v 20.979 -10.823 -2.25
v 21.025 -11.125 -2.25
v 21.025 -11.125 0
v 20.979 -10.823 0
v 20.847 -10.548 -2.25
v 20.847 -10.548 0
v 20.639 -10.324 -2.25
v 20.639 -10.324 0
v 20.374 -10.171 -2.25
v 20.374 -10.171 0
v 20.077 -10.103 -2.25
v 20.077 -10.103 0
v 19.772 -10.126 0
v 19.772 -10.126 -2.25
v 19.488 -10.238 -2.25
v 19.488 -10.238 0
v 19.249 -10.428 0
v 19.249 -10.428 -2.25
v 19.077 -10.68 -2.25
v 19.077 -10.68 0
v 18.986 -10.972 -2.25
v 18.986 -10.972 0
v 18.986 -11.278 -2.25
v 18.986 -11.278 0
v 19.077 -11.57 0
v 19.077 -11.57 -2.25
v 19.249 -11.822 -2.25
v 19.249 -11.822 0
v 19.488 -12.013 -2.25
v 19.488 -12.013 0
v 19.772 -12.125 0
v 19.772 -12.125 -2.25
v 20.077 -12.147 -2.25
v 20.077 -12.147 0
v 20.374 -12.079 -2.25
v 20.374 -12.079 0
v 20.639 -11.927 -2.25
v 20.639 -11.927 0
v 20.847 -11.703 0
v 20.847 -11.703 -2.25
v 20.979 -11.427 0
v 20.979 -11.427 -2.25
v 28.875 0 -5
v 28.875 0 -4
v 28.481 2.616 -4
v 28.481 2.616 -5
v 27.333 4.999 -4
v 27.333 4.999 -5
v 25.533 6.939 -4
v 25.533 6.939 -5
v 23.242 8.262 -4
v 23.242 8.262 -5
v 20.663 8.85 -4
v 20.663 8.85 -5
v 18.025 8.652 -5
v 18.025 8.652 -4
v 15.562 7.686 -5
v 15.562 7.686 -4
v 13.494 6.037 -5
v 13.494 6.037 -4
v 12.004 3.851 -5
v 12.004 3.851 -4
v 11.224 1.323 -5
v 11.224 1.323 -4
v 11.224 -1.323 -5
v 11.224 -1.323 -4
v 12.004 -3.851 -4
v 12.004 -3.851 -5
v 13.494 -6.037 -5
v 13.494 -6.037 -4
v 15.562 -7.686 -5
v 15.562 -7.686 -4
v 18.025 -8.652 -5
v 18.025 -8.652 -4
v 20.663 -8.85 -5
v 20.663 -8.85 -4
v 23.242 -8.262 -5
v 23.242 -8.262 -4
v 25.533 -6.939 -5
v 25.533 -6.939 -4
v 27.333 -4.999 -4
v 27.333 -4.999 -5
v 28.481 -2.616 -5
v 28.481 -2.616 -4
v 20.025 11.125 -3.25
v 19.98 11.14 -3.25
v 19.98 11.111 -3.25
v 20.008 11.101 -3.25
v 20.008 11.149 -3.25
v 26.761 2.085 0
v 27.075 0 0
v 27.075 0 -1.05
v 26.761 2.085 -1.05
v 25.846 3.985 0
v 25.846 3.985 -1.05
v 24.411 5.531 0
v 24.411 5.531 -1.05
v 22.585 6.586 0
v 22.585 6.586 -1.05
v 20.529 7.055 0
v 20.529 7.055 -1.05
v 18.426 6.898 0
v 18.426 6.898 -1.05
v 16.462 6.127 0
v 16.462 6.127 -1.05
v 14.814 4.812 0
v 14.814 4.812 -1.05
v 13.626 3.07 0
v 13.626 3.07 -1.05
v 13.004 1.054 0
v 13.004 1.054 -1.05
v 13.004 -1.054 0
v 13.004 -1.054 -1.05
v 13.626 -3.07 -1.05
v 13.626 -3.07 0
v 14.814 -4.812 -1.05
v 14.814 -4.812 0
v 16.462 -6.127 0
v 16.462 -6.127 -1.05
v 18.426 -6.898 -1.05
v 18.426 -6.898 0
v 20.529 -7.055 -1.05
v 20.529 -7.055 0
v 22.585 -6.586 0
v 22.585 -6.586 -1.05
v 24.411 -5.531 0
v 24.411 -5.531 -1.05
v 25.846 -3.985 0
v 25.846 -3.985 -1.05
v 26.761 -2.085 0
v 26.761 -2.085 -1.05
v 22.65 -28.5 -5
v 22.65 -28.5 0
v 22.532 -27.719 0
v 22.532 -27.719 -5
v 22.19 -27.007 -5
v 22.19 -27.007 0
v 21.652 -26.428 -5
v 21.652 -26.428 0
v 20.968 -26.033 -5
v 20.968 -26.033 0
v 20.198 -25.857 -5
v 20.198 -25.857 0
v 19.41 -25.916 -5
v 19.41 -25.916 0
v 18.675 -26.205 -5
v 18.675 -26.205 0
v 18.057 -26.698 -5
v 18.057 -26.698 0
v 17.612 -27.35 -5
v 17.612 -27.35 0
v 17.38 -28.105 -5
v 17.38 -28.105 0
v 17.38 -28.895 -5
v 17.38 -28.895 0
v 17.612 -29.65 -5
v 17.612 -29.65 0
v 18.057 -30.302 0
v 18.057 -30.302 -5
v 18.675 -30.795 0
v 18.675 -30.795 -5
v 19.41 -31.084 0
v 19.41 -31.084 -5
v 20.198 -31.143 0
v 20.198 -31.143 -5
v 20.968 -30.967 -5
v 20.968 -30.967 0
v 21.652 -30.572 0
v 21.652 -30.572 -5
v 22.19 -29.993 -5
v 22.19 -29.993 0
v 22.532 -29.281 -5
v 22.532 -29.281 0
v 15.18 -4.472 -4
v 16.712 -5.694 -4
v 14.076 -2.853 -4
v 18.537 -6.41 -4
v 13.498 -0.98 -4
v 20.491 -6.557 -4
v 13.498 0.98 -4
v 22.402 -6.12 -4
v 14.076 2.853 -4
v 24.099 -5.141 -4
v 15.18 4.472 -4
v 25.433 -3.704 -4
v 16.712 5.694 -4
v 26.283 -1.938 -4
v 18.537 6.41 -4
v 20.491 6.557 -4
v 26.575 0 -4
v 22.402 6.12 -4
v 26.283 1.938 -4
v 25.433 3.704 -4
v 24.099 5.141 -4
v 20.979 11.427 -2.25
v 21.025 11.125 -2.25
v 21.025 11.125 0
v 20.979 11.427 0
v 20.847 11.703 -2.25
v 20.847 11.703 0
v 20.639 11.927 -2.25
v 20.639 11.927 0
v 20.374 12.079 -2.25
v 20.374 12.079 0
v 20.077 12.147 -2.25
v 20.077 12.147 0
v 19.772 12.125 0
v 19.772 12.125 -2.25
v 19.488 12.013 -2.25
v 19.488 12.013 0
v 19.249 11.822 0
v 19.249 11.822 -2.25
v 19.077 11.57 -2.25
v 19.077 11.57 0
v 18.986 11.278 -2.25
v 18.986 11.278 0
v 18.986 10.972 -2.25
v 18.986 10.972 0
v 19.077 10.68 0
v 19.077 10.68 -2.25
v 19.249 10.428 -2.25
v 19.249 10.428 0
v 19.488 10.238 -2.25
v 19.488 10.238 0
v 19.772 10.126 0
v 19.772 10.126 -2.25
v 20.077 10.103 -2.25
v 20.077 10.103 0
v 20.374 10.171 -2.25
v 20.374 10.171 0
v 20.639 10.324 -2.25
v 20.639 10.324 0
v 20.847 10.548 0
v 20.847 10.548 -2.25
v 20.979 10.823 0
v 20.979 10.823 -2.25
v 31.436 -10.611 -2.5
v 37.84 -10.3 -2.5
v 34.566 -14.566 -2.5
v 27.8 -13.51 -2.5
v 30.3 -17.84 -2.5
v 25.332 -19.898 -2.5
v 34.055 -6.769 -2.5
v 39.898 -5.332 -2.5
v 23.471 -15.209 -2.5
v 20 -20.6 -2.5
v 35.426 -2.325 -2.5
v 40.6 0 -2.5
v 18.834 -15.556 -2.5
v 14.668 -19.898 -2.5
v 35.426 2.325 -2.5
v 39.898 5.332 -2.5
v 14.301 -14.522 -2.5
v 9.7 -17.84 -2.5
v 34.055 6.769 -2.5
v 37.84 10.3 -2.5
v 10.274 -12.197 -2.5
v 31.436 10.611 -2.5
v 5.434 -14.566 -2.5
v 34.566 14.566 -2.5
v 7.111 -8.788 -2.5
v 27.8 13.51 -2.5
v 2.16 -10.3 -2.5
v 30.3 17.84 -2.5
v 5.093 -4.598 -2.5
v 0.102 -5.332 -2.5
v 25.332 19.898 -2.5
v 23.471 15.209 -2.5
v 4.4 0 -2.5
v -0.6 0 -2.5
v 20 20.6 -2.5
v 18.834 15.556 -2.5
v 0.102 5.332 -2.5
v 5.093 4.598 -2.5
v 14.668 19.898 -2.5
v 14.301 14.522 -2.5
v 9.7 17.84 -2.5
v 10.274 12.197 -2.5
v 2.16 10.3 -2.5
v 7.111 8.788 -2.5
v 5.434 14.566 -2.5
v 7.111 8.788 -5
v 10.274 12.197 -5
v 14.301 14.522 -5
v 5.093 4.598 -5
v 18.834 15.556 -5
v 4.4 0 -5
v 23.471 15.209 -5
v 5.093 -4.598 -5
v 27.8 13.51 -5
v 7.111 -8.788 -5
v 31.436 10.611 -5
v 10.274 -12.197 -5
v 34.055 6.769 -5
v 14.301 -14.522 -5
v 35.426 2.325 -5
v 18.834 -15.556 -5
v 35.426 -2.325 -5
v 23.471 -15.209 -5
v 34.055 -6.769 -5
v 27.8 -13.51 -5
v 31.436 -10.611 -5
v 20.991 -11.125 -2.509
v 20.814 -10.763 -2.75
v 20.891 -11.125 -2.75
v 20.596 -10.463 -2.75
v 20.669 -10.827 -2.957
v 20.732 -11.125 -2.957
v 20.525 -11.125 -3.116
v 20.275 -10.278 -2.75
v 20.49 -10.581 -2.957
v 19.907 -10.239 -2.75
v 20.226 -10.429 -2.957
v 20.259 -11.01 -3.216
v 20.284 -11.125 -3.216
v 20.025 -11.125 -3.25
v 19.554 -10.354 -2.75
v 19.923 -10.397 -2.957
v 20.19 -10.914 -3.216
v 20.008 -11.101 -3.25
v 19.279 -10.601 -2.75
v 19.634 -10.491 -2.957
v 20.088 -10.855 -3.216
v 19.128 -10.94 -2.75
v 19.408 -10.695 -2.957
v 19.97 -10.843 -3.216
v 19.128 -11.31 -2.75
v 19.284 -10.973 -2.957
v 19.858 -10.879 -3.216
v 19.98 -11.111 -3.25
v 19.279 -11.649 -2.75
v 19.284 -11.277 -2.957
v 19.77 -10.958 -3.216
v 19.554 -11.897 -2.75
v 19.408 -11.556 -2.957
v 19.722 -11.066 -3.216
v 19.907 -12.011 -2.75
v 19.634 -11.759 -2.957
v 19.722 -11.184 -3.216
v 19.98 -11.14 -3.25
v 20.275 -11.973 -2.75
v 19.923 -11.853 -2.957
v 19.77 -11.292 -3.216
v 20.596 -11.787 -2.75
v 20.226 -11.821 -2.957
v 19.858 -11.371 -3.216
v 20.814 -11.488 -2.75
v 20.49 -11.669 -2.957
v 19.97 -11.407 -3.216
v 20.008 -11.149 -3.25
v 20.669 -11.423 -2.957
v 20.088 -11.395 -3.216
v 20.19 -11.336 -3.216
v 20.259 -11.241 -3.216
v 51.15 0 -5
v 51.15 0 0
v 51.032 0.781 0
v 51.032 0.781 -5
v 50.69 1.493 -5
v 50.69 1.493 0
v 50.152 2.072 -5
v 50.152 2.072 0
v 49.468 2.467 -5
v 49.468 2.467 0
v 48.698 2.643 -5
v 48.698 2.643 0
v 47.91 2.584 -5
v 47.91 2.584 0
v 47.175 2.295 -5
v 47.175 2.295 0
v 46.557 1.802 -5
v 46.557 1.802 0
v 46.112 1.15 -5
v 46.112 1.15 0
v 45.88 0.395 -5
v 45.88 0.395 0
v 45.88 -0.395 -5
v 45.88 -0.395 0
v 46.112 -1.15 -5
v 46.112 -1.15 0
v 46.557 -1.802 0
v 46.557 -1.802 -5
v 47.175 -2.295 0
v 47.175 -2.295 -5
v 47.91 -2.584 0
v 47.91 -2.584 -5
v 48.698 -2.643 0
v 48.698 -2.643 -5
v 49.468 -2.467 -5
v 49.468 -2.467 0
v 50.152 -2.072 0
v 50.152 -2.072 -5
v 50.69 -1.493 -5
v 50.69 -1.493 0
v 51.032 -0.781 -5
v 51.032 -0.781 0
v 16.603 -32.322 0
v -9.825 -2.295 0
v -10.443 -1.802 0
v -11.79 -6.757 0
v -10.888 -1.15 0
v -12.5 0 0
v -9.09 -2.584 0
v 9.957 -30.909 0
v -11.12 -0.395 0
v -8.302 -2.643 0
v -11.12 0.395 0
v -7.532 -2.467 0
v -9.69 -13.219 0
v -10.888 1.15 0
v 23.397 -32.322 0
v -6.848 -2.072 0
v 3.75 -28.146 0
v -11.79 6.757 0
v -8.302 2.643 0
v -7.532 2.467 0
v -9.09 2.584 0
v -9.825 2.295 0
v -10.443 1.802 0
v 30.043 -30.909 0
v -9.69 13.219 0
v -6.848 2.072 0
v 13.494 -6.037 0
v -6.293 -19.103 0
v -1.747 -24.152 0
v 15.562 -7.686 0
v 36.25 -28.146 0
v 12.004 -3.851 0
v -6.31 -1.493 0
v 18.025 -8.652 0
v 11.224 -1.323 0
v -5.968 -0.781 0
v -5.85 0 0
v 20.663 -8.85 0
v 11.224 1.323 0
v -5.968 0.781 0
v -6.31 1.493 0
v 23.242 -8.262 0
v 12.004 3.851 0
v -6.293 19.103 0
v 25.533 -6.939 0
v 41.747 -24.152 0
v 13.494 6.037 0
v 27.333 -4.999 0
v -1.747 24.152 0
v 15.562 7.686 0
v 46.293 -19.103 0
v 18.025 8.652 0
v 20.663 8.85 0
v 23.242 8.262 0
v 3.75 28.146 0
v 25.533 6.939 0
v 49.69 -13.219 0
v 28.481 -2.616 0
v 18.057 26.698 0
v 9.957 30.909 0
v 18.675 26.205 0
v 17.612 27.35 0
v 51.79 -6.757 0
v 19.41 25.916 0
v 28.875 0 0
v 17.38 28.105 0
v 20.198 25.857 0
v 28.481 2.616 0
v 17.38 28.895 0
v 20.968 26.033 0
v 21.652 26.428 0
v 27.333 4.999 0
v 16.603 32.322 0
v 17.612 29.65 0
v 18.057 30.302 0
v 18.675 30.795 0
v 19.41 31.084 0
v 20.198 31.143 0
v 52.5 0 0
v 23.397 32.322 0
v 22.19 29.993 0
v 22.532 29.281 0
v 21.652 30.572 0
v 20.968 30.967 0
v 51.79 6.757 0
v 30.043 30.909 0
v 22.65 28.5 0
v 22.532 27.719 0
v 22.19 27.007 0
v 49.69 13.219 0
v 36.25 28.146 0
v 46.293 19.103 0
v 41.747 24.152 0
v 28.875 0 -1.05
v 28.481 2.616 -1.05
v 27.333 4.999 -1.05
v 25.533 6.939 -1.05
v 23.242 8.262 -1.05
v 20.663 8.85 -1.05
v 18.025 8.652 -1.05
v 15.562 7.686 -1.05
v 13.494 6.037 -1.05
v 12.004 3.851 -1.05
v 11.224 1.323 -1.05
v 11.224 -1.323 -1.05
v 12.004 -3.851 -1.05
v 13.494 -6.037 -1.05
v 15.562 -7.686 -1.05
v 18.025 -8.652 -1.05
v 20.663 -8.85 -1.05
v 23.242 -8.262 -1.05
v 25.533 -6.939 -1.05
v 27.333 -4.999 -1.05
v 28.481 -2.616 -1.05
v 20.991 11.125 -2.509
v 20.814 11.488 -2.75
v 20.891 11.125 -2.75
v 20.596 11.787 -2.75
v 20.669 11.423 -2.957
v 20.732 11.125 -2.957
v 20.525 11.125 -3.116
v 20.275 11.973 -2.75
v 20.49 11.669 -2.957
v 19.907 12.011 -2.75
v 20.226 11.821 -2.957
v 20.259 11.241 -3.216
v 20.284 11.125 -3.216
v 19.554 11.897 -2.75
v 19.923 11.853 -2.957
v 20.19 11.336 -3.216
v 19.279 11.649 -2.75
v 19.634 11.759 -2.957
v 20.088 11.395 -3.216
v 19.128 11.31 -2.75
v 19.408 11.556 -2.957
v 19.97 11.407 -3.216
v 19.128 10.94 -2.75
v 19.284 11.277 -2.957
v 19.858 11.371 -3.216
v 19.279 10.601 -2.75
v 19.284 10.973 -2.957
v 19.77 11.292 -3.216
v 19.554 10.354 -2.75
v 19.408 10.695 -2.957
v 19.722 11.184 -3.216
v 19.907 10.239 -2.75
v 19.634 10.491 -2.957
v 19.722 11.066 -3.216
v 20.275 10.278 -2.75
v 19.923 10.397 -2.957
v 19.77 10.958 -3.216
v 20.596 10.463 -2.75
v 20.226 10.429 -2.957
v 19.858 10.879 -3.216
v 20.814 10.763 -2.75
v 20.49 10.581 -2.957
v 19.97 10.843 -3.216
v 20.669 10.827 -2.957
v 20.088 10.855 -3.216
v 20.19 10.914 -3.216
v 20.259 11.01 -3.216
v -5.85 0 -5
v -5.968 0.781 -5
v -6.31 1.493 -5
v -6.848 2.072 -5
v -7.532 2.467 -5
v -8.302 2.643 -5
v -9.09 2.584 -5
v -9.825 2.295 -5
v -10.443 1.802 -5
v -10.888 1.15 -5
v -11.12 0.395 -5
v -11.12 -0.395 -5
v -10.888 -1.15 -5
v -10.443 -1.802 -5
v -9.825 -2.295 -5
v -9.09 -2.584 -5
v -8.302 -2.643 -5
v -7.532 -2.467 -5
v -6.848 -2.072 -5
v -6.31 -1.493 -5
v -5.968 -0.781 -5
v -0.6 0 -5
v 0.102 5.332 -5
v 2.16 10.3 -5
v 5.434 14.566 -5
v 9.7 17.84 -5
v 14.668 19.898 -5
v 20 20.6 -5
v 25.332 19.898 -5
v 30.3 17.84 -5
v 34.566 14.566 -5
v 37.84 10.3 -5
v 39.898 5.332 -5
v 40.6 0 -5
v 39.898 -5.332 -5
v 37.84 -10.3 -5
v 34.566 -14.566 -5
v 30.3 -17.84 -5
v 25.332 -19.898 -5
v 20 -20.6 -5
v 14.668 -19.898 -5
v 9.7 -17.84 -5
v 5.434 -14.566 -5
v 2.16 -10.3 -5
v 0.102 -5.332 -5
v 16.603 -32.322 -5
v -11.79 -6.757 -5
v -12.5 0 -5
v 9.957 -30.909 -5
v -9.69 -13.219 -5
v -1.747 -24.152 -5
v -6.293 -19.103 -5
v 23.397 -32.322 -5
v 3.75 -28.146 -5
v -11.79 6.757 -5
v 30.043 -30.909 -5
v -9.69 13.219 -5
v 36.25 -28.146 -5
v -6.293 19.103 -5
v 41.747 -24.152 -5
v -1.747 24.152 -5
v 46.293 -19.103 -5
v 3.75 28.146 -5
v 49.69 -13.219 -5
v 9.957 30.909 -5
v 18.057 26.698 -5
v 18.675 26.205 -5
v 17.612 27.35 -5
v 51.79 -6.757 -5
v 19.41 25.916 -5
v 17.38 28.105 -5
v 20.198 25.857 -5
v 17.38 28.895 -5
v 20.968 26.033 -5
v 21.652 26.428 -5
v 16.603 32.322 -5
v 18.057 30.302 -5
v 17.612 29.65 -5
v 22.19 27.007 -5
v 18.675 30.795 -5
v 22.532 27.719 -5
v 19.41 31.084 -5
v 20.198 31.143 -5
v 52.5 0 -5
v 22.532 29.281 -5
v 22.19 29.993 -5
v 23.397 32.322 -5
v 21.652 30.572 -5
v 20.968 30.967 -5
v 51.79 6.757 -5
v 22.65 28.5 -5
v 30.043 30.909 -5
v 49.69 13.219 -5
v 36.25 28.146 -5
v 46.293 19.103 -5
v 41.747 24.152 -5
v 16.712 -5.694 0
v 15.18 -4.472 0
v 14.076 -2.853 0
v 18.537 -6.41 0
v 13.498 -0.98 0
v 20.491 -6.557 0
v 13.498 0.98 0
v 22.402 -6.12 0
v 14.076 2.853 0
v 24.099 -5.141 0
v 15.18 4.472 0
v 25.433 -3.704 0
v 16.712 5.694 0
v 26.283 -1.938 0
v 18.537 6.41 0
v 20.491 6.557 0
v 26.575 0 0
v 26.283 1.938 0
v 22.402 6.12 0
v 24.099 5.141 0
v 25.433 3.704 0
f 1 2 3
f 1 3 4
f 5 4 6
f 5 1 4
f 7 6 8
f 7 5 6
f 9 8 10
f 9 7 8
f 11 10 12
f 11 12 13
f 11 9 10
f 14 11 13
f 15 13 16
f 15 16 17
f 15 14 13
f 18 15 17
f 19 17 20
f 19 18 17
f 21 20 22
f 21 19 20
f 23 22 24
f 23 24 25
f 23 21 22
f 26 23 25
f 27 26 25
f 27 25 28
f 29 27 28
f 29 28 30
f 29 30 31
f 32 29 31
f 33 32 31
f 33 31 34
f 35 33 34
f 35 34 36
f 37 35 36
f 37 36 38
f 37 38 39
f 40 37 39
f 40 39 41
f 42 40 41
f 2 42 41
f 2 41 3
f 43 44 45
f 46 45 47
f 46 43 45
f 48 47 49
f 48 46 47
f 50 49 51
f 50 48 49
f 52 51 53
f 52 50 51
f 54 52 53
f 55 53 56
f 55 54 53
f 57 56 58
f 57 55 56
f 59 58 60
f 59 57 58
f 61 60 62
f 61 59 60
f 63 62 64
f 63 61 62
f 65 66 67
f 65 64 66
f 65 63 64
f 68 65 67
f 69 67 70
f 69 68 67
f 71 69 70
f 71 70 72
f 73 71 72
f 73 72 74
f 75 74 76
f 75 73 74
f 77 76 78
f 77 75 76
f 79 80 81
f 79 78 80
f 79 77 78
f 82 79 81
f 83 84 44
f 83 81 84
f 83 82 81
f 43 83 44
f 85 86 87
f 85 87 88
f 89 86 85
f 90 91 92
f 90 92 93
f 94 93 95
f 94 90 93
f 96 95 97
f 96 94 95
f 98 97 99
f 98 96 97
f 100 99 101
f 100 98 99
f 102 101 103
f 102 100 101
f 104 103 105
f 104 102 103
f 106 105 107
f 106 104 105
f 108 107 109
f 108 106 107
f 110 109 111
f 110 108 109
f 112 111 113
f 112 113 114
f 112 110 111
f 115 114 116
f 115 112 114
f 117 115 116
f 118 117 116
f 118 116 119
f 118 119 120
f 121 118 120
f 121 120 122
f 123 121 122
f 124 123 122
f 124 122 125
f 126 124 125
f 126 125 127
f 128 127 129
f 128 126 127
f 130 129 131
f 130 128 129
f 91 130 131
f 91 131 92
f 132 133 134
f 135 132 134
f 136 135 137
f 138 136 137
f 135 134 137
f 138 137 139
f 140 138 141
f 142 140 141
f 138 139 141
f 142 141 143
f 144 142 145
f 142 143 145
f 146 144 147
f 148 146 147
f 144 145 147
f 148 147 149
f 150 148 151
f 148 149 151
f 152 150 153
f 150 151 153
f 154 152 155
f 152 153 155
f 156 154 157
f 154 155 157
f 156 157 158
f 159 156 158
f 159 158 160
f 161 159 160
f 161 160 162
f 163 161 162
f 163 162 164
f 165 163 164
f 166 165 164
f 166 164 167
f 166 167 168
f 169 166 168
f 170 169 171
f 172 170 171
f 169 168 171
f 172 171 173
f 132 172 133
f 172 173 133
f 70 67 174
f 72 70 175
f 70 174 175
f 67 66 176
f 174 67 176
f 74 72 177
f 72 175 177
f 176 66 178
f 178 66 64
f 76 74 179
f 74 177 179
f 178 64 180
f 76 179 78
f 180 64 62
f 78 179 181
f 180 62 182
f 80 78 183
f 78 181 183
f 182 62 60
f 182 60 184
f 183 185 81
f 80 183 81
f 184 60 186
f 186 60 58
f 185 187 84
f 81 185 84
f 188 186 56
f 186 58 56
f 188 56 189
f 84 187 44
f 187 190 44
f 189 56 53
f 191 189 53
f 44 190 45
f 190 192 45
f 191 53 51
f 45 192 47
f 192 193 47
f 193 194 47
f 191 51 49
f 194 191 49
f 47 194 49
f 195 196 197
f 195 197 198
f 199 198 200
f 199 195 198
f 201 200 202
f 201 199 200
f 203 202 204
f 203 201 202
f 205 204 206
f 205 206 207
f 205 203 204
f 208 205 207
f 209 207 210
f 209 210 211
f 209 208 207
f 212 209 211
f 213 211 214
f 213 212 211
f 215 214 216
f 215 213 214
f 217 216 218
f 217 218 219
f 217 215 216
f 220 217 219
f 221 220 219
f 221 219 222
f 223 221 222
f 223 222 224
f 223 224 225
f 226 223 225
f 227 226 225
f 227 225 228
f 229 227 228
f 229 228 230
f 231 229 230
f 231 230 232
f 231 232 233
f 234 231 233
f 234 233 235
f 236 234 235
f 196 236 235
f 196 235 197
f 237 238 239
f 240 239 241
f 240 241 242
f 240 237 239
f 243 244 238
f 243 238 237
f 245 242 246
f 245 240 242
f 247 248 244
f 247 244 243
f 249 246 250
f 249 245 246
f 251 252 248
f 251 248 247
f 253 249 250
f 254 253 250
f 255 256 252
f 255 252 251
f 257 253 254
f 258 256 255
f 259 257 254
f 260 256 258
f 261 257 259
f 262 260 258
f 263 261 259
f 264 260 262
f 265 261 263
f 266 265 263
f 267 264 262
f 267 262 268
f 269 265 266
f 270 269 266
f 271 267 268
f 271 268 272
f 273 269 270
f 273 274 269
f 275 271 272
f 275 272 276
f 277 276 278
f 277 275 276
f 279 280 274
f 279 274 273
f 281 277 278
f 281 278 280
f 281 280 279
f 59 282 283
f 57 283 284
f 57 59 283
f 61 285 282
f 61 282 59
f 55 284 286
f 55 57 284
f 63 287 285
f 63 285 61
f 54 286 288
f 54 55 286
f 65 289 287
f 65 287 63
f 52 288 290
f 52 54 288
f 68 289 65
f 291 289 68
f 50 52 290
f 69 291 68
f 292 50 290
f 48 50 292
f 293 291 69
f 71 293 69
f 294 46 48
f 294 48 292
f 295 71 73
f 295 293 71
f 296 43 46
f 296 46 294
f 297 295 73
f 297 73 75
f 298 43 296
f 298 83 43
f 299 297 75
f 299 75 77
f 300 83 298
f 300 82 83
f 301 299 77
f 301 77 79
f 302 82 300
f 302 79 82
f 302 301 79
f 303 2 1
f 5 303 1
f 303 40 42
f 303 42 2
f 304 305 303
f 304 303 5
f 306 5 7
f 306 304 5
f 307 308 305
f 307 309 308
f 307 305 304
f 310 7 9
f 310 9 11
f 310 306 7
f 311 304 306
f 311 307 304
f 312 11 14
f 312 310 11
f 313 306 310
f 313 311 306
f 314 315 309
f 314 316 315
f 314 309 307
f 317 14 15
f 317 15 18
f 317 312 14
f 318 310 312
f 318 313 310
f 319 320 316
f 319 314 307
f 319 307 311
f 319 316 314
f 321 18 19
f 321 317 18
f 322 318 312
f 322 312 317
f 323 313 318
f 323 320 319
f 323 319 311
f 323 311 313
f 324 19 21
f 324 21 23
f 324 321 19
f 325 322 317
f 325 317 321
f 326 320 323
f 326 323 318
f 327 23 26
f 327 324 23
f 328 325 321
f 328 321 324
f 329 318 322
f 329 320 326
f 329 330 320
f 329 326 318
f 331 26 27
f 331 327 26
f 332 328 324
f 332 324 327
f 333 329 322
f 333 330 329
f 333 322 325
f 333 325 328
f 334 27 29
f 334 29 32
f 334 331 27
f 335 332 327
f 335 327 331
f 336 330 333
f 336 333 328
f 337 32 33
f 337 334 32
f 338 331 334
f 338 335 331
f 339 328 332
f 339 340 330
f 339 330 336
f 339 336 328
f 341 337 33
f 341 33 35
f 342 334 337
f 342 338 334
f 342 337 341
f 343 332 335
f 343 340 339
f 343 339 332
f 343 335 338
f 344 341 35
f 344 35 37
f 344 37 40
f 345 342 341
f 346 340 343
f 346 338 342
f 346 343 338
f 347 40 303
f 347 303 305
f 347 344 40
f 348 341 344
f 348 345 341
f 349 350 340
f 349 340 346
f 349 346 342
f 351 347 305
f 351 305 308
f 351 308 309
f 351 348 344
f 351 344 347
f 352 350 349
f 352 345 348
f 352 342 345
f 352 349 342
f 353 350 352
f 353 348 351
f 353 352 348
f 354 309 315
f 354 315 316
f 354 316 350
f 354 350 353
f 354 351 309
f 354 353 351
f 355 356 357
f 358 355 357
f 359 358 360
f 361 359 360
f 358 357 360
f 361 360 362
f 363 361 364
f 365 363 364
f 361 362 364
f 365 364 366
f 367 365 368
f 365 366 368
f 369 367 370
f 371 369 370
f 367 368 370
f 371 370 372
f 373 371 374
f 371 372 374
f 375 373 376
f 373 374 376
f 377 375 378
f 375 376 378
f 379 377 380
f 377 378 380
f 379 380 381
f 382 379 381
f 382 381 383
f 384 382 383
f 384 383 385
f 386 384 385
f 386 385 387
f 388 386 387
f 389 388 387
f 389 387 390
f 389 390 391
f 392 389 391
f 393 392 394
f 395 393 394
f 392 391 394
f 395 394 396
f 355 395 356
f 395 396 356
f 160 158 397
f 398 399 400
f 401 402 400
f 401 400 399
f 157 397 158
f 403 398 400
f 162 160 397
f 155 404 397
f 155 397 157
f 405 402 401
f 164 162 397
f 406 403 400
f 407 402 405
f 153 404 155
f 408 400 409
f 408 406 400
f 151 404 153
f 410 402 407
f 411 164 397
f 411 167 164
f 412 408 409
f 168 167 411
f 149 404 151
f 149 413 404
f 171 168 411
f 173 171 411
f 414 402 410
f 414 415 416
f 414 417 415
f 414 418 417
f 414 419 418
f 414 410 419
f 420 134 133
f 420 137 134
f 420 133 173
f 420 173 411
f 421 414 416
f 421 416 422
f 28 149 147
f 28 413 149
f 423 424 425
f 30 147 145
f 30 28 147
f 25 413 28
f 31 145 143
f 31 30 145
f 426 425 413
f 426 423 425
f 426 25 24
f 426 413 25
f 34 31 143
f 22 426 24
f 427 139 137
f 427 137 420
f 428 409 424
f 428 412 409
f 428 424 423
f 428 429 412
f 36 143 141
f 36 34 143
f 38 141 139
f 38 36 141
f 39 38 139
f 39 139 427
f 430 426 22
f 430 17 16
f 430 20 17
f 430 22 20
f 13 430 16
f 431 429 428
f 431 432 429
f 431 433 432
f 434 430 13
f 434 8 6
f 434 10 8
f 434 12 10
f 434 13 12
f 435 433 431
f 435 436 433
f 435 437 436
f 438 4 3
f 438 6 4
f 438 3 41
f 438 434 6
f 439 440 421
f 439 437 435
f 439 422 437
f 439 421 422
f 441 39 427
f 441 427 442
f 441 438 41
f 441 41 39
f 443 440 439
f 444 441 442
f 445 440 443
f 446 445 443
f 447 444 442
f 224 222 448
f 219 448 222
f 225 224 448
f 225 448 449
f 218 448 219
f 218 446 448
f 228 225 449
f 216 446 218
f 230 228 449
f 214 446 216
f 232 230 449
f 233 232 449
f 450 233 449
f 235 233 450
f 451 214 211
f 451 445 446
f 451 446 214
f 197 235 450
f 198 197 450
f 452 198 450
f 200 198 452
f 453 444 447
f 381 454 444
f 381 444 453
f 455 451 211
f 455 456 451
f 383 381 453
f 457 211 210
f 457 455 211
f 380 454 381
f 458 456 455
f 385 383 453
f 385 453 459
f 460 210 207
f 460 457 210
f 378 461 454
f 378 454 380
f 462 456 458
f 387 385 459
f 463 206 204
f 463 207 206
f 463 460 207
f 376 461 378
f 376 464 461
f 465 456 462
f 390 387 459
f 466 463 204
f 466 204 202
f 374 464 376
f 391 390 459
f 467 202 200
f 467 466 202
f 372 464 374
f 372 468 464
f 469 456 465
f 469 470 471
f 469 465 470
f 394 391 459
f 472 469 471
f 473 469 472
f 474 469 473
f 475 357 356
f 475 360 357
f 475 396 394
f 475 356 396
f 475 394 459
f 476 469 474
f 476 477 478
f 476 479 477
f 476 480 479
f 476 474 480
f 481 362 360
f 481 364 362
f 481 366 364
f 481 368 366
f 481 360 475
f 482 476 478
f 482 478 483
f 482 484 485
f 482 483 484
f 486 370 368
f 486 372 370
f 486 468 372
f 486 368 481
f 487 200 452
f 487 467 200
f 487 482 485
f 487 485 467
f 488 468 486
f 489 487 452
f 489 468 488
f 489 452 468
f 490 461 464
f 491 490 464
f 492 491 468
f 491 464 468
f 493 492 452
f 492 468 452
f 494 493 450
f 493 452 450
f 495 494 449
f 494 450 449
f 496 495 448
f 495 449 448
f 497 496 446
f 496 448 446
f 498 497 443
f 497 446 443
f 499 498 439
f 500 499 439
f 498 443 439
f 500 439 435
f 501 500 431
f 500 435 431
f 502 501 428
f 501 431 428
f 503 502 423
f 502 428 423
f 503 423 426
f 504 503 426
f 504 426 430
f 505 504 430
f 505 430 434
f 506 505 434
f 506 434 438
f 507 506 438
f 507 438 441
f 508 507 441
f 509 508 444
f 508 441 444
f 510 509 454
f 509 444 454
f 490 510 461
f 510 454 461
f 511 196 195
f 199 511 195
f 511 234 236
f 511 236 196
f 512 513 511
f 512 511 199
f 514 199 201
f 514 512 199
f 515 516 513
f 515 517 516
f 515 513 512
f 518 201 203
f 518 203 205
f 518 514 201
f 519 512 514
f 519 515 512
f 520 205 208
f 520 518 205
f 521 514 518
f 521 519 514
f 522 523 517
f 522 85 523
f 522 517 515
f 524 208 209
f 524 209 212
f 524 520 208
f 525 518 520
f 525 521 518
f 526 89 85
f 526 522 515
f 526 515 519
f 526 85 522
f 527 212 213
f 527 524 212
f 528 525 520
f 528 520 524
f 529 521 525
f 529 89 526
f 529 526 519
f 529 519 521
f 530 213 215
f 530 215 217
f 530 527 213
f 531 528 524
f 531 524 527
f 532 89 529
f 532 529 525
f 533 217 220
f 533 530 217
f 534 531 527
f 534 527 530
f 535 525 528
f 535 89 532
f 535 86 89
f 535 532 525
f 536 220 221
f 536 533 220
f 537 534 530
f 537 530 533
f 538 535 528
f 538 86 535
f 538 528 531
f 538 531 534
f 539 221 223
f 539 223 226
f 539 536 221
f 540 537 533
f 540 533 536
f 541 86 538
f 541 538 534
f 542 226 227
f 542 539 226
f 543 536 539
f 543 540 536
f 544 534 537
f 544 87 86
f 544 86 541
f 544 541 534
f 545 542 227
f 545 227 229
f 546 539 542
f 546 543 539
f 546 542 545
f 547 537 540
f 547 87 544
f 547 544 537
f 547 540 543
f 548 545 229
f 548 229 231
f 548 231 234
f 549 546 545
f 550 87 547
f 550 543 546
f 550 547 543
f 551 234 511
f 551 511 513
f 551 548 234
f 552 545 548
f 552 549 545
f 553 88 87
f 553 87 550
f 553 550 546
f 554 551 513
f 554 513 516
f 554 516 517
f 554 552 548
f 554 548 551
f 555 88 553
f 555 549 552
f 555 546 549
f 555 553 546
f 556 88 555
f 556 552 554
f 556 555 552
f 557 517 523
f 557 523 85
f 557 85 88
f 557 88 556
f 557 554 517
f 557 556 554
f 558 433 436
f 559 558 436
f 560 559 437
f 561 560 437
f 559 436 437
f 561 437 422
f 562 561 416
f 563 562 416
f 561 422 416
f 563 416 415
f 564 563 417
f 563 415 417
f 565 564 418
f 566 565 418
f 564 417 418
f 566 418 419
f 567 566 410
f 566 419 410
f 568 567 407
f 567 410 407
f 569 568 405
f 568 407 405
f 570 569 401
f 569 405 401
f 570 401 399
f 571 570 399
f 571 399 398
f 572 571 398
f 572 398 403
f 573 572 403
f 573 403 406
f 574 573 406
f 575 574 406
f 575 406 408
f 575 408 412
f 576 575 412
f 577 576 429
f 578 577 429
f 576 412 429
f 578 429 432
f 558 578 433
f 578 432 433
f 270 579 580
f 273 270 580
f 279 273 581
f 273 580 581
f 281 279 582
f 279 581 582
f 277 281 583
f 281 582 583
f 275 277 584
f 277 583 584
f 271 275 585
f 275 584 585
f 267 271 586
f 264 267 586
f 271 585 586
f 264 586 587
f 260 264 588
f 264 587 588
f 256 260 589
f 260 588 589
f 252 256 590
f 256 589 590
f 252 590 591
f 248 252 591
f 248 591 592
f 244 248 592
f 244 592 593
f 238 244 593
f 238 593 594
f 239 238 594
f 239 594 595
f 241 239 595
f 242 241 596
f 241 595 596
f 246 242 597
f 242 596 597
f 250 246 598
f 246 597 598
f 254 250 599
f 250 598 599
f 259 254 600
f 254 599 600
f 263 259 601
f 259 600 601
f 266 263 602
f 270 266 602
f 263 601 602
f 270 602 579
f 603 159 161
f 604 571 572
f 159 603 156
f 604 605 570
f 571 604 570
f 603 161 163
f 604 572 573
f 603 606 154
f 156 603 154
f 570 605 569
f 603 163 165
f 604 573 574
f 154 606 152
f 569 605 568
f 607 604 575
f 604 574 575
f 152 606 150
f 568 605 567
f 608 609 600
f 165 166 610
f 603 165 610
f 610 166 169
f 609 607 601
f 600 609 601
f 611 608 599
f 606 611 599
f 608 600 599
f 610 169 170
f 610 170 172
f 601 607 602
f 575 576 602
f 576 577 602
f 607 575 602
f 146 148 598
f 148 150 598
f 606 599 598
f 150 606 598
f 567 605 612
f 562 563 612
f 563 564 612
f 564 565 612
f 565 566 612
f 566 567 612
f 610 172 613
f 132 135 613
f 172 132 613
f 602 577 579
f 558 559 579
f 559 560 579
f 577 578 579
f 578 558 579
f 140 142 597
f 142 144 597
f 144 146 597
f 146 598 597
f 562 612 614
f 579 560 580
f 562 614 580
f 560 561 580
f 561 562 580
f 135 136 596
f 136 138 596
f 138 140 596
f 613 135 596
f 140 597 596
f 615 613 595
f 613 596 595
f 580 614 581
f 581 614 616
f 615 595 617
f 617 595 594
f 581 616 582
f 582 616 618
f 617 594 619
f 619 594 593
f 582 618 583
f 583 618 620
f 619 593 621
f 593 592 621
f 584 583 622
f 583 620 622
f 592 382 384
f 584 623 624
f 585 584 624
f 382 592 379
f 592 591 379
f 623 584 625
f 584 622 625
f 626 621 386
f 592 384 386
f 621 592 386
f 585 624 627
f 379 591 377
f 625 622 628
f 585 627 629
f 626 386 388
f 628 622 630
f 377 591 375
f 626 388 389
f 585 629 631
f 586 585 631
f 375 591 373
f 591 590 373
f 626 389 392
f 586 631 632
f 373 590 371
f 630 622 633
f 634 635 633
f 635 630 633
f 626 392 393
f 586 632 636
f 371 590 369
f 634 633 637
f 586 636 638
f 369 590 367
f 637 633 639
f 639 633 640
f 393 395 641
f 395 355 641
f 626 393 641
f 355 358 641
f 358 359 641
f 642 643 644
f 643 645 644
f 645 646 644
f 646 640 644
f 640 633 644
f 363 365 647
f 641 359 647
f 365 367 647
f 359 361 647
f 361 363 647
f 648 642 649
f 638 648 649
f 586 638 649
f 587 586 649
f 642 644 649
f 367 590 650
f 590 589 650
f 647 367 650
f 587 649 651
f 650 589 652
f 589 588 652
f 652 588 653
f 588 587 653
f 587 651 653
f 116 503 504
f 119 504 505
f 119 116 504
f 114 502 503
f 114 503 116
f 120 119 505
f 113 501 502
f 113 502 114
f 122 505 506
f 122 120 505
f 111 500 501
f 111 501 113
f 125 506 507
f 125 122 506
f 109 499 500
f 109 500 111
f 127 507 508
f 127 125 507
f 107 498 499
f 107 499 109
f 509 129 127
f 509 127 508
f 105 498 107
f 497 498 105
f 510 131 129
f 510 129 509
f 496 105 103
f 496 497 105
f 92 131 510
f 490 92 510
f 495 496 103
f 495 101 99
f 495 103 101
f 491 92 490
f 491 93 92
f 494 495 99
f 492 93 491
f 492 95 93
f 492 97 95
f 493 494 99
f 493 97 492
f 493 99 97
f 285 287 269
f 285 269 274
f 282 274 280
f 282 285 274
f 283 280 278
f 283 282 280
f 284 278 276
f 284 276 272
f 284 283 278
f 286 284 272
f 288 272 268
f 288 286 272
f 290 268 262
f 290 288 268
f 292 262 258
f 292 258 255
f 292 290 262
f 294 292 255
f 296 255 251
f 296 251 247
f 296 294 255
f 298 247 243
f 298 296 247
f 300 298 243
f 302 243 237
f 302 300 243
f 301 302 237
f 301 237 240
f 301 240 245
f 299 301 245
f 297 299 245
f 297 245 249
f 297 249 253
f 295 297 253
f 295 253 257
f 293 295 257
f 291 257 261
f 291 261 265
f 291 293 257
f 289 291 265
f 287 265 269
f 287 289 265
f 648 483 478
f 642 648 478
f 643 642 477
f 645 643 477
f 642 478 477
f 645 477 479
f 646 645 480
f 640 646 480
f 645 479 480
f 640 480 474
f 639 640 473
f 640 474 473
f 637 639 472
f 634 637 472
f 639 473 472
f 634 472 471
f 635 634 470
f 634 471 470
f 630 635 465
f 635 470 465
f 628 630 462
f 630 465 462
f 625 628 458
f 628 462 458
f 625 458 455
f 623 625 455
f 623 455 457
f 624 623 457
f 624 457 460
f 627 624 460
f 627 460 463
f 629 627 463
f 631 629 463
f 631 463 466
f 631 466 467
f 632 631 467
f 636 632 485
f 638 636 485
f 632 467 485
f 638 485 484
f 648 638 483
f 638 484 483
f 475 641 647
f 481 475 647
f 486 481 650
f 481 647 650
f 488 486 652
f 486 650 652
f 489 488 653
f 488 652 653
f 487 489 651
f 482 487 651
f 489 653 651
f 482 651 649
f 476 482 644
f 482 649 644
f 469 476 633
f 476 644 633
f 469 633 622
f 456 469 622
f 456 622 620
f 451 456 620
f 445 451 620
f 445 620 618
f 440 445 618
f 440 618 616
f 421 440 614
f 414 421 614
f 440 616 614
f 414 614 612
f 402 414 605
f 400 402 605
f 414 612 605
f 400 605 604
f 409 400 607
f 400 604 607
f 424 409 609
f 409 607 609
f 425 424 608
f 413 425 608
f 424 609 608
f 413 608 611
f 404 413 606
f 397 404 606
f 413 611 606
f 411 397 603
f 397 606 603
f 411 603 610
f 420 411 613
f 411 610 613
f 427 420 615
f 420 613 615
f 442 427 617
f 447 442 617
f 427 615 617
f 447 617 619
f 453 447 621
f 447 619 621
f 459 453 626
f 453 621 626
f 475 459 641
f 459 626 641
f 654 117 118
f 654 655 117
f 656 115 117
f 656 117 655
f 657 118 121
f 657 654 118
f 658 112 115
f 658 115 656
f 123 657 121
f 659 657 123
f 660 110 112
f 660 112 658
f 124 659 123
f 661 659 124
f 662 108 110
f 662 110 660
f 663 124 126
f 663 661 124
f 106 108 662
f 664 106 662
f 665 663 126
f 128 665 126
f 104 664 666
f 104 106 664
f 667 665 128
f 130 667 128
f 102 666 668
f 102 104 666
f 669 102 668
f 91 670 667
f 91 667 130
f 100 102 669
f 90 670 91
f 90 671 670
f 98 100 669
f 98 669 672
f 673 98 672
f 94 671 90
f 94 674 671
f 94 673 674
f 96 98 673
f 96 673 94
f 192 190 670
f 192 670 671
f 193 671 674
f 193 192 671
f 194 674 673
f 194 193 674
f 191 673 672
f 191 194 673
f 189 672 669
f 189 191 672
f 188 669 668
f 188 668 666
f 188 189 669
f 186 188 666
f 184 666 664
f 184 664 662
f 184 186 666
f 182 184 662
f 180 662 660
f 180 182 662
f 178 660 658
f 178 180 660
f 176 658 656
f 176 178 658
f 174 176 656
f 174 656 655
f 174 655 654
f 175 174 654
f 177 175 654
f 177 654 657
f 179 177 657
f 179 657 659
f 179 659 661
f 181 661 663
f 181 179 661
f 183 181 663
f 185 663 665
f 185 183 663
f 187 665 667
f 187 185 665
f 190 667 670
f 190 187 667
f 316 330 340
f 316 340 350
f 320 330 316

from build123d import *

# Parameters (mm, degrees)
BOSS_EXTRUDE1_START       = -4
BOSS_EXTRUDE1_OUTLINE_R   = 2.2
BOSS_EXTRUDE1_OUTLINE_R_2 = 1.025
BOSS_EXTRUDE1_OUTLINE_R_3 = 6.575
BOSS_EXTRUDE1_DEPTH       = 4
SKETCH3_R                 = 8.875
SKETCH3_R_2               = 7.075
CUT_EXTRUDE1_DEPTH        = 1.05
BOSS_EXTRUDE2_START       = -4
SKETCH4_R                 = 1.025
BOSS_EXTRUDE2_DEPTH       = 0.75
FILLET1_R                 = 1
BOSS_EXTRUDE3_START       = -5
SKETCH5_R                 = 32.5
SKETCH5_R_2               = 1.025
SKETCH5_R_3               = 8.875
BOSS_EXTRUDE3_DEPTH       = 5
SKETCH6_R                 = 2.65
CUT_EXTRUDE2_DEPTH        = 5
SKETCH7_R                 = 20.6
SKETCH7_R_2               = 15.6
CUT_EXTRUDE3_DEPTH        = 2.5
BOSS_EXTRUDE4_START       = 1
SKETCH8_R                 = 1.025
BOSS_EXTRUDE4_DEPTH       = 1


# Read off the part's stored shape, not the designer's step: Boss-Extrude1
with BuildPart() as part:
    # Boss-Extrude1 outline → Boss-Extrude1 (new body)
    with BuildSketch(Plane.XY.offset(BOSS_EXTRUDE1_START)):
        with BuildLine():
            Line((-5.8, 12.8), (-5.8, -12.8))
            ThreePointArc((-5.8, -12.8), (-1.992388155, -21.992388155), (7.2, -25.8))
            Line((7.2, -25.8), (32.8, -25.8))
            ThreePointArc((32.8, -25.8), (41.992388155, -21.992388155), (45.8, -12.8))
            Line((45.8, -12.8), (45.8, 12.8))
            ThreePointArc((45.8, 12.8), (41.992388155, 21.992388155), (32.8, 25.8))
            Line((32.8, 25.8), (7.2, 25.8))
            ThreePointArc((7.2, 25.8), (-1.992388155, 21.992388155), (-5.8, 12.8))
        make_face()
        with Locations((25, -22)):
            Circle(BOSS_EXTRUDE1_OUTLINE_R, mode=Mode.SUBTRACT)
        with Locations((20, -11.1252)):
            Circle(BOSS_EXTRUDE1_OUTLINE_R_2, mode=Mode.SUBTRACT)
        with Locations((-2, 0)):
            Circle(BOSS_EXTRUDE1_OUTLINE_R, mode=Mode.SUBTRACT)
        with Locations((20, 0)):
            Circle(BOSS_EXTRUDE1_OUTLINE_R_3, mode=Mode.SUBTRACT)
        with Locations((20, 11.1252)):
            Circle(BOSS_EXTRUDE1_OUTLINE_R_2, mode=Mode.SUBTRACT)
        with Locations((42, 0)):
            Circle(BOSS_EXTRUDE1_OUTLINE_R, mode=Mode.SUBTRACT)
        with Locations((25, 22)):
            Circle(BOSS_EXTRUDE1_OUTLINE_R, mode=Mode.SUBTRACT)
    extrude(amount=BOSS_EXTRUDE1_DEPTH)

    # Sketch3 → Cut-Extrude1 (cut)
    with BuildSketch(Plane.XY):
        with Locations((20, 0)):
            Circle(SKETCH3_R)
        with Locations((20, 0)):
            Circle(SKETCH3_R_2, mode=Mode.SUBTRACT)
    extrude(amount=-CUT_EXTRUDE1_DEPTH, mode=Mode.SUBTRACT)

    # Sketch4 → Boss-Extrude2 (add)
    with BuildSketch(Plane.XY.offset(BOSS_EXTRUDE2_START)):
        with Locations((20, 11.1252)):
            Circle(SKETCH4_R)
        with Locations((20, -11.1252)):
            Circle(SKETCH4_R)
    extrude(amount=BOSS_EXTRUDE2_DEPTH)

    # Fillet1
    fillet1_edges = [part.edges().sort_by_distance(p)[0] for p in [
        (18.975, 11.1252, -3.25),
        (18.975, -11.1252, -3.25),
    ]]
    fillet(fillet1_edges, radius=FILLET1_R)

    # Sketch5 → Boss-Extrude3 (add)
    with BuildSketch(Plane.XY.offset(BOSS_EXTRUDE3_START)):
        with Locations((20, 0)):
            Circle(SKETCH5_R)
        with Locations((20, -11.1252)):
            Circle(SKETCH5_R_2, mode=Mode.SUBTRACT)
        with Locations((20, 11.1252)):
            Circle(SKETCH5_R_2, mode=Mode.SUBTRACT)
        with Locations((20, 0)):
            Circle(SKETCH5_R_3, mode=Mode.SUBTRACT)
    extrude(amount=BOSS_EXTRUDE3_DEPTH)

    # Sketch6 → Cut-Extrude2 (cut)
    with BuildSketch(Plane.XY):
        with Locations((-8.5, 0)):
            Circle(SKETCH6_R)
        with Locations((20, 28.5)):
            Circle(SKETCH6_R)
        with Locations((48.5, 0)):
            Circle(SKETCH6_R)
        with Locations((20, -28.5)):
            Circle(SKETCH6_R)
    extrude(amount=-CUT_EXTRUDE2_DEPTH, mode=Mode.SUBTRACT)

    # Sketch7 → Cut-Extrude3 (cut)
    with BuildSketch(Plane(origin=(0, 0, -5), x_dir=(-1, 0, 0), z_dir=(0, 0, -1))):
        with Locations((-20, 0)):
            Circle(SKETCH7_R)
        with Locations((-20, 0)):
            Circle(SKETCH7_R_2, mode=Mode.SUBTRACT)
    extrude(amount=-CUT_EXTRUDE3_DEPTH, mode=Mode.SUBTRACT)

    # Sketch8 → Boss-Extrude4 (add)
    with BuildSketch(Plane(origin=(0, 0, -4), x_dir=(-1, 0, 0), z_dir=(0, 0, -1)).offset(BOSS_EXTRUDE4_START)):
        with Locations(Location((-20, -11.1252, 0), (0, 0, 180))):
            Circle(SKETCH8_R)
        with Locations(Location((-20, 11.1252, 0), (0, 0, 180))):
            Circle(SKETCH8_R)
    extrude(amount=-BOSS_EXTRUDE4_DEPTH)


solid = part.part
